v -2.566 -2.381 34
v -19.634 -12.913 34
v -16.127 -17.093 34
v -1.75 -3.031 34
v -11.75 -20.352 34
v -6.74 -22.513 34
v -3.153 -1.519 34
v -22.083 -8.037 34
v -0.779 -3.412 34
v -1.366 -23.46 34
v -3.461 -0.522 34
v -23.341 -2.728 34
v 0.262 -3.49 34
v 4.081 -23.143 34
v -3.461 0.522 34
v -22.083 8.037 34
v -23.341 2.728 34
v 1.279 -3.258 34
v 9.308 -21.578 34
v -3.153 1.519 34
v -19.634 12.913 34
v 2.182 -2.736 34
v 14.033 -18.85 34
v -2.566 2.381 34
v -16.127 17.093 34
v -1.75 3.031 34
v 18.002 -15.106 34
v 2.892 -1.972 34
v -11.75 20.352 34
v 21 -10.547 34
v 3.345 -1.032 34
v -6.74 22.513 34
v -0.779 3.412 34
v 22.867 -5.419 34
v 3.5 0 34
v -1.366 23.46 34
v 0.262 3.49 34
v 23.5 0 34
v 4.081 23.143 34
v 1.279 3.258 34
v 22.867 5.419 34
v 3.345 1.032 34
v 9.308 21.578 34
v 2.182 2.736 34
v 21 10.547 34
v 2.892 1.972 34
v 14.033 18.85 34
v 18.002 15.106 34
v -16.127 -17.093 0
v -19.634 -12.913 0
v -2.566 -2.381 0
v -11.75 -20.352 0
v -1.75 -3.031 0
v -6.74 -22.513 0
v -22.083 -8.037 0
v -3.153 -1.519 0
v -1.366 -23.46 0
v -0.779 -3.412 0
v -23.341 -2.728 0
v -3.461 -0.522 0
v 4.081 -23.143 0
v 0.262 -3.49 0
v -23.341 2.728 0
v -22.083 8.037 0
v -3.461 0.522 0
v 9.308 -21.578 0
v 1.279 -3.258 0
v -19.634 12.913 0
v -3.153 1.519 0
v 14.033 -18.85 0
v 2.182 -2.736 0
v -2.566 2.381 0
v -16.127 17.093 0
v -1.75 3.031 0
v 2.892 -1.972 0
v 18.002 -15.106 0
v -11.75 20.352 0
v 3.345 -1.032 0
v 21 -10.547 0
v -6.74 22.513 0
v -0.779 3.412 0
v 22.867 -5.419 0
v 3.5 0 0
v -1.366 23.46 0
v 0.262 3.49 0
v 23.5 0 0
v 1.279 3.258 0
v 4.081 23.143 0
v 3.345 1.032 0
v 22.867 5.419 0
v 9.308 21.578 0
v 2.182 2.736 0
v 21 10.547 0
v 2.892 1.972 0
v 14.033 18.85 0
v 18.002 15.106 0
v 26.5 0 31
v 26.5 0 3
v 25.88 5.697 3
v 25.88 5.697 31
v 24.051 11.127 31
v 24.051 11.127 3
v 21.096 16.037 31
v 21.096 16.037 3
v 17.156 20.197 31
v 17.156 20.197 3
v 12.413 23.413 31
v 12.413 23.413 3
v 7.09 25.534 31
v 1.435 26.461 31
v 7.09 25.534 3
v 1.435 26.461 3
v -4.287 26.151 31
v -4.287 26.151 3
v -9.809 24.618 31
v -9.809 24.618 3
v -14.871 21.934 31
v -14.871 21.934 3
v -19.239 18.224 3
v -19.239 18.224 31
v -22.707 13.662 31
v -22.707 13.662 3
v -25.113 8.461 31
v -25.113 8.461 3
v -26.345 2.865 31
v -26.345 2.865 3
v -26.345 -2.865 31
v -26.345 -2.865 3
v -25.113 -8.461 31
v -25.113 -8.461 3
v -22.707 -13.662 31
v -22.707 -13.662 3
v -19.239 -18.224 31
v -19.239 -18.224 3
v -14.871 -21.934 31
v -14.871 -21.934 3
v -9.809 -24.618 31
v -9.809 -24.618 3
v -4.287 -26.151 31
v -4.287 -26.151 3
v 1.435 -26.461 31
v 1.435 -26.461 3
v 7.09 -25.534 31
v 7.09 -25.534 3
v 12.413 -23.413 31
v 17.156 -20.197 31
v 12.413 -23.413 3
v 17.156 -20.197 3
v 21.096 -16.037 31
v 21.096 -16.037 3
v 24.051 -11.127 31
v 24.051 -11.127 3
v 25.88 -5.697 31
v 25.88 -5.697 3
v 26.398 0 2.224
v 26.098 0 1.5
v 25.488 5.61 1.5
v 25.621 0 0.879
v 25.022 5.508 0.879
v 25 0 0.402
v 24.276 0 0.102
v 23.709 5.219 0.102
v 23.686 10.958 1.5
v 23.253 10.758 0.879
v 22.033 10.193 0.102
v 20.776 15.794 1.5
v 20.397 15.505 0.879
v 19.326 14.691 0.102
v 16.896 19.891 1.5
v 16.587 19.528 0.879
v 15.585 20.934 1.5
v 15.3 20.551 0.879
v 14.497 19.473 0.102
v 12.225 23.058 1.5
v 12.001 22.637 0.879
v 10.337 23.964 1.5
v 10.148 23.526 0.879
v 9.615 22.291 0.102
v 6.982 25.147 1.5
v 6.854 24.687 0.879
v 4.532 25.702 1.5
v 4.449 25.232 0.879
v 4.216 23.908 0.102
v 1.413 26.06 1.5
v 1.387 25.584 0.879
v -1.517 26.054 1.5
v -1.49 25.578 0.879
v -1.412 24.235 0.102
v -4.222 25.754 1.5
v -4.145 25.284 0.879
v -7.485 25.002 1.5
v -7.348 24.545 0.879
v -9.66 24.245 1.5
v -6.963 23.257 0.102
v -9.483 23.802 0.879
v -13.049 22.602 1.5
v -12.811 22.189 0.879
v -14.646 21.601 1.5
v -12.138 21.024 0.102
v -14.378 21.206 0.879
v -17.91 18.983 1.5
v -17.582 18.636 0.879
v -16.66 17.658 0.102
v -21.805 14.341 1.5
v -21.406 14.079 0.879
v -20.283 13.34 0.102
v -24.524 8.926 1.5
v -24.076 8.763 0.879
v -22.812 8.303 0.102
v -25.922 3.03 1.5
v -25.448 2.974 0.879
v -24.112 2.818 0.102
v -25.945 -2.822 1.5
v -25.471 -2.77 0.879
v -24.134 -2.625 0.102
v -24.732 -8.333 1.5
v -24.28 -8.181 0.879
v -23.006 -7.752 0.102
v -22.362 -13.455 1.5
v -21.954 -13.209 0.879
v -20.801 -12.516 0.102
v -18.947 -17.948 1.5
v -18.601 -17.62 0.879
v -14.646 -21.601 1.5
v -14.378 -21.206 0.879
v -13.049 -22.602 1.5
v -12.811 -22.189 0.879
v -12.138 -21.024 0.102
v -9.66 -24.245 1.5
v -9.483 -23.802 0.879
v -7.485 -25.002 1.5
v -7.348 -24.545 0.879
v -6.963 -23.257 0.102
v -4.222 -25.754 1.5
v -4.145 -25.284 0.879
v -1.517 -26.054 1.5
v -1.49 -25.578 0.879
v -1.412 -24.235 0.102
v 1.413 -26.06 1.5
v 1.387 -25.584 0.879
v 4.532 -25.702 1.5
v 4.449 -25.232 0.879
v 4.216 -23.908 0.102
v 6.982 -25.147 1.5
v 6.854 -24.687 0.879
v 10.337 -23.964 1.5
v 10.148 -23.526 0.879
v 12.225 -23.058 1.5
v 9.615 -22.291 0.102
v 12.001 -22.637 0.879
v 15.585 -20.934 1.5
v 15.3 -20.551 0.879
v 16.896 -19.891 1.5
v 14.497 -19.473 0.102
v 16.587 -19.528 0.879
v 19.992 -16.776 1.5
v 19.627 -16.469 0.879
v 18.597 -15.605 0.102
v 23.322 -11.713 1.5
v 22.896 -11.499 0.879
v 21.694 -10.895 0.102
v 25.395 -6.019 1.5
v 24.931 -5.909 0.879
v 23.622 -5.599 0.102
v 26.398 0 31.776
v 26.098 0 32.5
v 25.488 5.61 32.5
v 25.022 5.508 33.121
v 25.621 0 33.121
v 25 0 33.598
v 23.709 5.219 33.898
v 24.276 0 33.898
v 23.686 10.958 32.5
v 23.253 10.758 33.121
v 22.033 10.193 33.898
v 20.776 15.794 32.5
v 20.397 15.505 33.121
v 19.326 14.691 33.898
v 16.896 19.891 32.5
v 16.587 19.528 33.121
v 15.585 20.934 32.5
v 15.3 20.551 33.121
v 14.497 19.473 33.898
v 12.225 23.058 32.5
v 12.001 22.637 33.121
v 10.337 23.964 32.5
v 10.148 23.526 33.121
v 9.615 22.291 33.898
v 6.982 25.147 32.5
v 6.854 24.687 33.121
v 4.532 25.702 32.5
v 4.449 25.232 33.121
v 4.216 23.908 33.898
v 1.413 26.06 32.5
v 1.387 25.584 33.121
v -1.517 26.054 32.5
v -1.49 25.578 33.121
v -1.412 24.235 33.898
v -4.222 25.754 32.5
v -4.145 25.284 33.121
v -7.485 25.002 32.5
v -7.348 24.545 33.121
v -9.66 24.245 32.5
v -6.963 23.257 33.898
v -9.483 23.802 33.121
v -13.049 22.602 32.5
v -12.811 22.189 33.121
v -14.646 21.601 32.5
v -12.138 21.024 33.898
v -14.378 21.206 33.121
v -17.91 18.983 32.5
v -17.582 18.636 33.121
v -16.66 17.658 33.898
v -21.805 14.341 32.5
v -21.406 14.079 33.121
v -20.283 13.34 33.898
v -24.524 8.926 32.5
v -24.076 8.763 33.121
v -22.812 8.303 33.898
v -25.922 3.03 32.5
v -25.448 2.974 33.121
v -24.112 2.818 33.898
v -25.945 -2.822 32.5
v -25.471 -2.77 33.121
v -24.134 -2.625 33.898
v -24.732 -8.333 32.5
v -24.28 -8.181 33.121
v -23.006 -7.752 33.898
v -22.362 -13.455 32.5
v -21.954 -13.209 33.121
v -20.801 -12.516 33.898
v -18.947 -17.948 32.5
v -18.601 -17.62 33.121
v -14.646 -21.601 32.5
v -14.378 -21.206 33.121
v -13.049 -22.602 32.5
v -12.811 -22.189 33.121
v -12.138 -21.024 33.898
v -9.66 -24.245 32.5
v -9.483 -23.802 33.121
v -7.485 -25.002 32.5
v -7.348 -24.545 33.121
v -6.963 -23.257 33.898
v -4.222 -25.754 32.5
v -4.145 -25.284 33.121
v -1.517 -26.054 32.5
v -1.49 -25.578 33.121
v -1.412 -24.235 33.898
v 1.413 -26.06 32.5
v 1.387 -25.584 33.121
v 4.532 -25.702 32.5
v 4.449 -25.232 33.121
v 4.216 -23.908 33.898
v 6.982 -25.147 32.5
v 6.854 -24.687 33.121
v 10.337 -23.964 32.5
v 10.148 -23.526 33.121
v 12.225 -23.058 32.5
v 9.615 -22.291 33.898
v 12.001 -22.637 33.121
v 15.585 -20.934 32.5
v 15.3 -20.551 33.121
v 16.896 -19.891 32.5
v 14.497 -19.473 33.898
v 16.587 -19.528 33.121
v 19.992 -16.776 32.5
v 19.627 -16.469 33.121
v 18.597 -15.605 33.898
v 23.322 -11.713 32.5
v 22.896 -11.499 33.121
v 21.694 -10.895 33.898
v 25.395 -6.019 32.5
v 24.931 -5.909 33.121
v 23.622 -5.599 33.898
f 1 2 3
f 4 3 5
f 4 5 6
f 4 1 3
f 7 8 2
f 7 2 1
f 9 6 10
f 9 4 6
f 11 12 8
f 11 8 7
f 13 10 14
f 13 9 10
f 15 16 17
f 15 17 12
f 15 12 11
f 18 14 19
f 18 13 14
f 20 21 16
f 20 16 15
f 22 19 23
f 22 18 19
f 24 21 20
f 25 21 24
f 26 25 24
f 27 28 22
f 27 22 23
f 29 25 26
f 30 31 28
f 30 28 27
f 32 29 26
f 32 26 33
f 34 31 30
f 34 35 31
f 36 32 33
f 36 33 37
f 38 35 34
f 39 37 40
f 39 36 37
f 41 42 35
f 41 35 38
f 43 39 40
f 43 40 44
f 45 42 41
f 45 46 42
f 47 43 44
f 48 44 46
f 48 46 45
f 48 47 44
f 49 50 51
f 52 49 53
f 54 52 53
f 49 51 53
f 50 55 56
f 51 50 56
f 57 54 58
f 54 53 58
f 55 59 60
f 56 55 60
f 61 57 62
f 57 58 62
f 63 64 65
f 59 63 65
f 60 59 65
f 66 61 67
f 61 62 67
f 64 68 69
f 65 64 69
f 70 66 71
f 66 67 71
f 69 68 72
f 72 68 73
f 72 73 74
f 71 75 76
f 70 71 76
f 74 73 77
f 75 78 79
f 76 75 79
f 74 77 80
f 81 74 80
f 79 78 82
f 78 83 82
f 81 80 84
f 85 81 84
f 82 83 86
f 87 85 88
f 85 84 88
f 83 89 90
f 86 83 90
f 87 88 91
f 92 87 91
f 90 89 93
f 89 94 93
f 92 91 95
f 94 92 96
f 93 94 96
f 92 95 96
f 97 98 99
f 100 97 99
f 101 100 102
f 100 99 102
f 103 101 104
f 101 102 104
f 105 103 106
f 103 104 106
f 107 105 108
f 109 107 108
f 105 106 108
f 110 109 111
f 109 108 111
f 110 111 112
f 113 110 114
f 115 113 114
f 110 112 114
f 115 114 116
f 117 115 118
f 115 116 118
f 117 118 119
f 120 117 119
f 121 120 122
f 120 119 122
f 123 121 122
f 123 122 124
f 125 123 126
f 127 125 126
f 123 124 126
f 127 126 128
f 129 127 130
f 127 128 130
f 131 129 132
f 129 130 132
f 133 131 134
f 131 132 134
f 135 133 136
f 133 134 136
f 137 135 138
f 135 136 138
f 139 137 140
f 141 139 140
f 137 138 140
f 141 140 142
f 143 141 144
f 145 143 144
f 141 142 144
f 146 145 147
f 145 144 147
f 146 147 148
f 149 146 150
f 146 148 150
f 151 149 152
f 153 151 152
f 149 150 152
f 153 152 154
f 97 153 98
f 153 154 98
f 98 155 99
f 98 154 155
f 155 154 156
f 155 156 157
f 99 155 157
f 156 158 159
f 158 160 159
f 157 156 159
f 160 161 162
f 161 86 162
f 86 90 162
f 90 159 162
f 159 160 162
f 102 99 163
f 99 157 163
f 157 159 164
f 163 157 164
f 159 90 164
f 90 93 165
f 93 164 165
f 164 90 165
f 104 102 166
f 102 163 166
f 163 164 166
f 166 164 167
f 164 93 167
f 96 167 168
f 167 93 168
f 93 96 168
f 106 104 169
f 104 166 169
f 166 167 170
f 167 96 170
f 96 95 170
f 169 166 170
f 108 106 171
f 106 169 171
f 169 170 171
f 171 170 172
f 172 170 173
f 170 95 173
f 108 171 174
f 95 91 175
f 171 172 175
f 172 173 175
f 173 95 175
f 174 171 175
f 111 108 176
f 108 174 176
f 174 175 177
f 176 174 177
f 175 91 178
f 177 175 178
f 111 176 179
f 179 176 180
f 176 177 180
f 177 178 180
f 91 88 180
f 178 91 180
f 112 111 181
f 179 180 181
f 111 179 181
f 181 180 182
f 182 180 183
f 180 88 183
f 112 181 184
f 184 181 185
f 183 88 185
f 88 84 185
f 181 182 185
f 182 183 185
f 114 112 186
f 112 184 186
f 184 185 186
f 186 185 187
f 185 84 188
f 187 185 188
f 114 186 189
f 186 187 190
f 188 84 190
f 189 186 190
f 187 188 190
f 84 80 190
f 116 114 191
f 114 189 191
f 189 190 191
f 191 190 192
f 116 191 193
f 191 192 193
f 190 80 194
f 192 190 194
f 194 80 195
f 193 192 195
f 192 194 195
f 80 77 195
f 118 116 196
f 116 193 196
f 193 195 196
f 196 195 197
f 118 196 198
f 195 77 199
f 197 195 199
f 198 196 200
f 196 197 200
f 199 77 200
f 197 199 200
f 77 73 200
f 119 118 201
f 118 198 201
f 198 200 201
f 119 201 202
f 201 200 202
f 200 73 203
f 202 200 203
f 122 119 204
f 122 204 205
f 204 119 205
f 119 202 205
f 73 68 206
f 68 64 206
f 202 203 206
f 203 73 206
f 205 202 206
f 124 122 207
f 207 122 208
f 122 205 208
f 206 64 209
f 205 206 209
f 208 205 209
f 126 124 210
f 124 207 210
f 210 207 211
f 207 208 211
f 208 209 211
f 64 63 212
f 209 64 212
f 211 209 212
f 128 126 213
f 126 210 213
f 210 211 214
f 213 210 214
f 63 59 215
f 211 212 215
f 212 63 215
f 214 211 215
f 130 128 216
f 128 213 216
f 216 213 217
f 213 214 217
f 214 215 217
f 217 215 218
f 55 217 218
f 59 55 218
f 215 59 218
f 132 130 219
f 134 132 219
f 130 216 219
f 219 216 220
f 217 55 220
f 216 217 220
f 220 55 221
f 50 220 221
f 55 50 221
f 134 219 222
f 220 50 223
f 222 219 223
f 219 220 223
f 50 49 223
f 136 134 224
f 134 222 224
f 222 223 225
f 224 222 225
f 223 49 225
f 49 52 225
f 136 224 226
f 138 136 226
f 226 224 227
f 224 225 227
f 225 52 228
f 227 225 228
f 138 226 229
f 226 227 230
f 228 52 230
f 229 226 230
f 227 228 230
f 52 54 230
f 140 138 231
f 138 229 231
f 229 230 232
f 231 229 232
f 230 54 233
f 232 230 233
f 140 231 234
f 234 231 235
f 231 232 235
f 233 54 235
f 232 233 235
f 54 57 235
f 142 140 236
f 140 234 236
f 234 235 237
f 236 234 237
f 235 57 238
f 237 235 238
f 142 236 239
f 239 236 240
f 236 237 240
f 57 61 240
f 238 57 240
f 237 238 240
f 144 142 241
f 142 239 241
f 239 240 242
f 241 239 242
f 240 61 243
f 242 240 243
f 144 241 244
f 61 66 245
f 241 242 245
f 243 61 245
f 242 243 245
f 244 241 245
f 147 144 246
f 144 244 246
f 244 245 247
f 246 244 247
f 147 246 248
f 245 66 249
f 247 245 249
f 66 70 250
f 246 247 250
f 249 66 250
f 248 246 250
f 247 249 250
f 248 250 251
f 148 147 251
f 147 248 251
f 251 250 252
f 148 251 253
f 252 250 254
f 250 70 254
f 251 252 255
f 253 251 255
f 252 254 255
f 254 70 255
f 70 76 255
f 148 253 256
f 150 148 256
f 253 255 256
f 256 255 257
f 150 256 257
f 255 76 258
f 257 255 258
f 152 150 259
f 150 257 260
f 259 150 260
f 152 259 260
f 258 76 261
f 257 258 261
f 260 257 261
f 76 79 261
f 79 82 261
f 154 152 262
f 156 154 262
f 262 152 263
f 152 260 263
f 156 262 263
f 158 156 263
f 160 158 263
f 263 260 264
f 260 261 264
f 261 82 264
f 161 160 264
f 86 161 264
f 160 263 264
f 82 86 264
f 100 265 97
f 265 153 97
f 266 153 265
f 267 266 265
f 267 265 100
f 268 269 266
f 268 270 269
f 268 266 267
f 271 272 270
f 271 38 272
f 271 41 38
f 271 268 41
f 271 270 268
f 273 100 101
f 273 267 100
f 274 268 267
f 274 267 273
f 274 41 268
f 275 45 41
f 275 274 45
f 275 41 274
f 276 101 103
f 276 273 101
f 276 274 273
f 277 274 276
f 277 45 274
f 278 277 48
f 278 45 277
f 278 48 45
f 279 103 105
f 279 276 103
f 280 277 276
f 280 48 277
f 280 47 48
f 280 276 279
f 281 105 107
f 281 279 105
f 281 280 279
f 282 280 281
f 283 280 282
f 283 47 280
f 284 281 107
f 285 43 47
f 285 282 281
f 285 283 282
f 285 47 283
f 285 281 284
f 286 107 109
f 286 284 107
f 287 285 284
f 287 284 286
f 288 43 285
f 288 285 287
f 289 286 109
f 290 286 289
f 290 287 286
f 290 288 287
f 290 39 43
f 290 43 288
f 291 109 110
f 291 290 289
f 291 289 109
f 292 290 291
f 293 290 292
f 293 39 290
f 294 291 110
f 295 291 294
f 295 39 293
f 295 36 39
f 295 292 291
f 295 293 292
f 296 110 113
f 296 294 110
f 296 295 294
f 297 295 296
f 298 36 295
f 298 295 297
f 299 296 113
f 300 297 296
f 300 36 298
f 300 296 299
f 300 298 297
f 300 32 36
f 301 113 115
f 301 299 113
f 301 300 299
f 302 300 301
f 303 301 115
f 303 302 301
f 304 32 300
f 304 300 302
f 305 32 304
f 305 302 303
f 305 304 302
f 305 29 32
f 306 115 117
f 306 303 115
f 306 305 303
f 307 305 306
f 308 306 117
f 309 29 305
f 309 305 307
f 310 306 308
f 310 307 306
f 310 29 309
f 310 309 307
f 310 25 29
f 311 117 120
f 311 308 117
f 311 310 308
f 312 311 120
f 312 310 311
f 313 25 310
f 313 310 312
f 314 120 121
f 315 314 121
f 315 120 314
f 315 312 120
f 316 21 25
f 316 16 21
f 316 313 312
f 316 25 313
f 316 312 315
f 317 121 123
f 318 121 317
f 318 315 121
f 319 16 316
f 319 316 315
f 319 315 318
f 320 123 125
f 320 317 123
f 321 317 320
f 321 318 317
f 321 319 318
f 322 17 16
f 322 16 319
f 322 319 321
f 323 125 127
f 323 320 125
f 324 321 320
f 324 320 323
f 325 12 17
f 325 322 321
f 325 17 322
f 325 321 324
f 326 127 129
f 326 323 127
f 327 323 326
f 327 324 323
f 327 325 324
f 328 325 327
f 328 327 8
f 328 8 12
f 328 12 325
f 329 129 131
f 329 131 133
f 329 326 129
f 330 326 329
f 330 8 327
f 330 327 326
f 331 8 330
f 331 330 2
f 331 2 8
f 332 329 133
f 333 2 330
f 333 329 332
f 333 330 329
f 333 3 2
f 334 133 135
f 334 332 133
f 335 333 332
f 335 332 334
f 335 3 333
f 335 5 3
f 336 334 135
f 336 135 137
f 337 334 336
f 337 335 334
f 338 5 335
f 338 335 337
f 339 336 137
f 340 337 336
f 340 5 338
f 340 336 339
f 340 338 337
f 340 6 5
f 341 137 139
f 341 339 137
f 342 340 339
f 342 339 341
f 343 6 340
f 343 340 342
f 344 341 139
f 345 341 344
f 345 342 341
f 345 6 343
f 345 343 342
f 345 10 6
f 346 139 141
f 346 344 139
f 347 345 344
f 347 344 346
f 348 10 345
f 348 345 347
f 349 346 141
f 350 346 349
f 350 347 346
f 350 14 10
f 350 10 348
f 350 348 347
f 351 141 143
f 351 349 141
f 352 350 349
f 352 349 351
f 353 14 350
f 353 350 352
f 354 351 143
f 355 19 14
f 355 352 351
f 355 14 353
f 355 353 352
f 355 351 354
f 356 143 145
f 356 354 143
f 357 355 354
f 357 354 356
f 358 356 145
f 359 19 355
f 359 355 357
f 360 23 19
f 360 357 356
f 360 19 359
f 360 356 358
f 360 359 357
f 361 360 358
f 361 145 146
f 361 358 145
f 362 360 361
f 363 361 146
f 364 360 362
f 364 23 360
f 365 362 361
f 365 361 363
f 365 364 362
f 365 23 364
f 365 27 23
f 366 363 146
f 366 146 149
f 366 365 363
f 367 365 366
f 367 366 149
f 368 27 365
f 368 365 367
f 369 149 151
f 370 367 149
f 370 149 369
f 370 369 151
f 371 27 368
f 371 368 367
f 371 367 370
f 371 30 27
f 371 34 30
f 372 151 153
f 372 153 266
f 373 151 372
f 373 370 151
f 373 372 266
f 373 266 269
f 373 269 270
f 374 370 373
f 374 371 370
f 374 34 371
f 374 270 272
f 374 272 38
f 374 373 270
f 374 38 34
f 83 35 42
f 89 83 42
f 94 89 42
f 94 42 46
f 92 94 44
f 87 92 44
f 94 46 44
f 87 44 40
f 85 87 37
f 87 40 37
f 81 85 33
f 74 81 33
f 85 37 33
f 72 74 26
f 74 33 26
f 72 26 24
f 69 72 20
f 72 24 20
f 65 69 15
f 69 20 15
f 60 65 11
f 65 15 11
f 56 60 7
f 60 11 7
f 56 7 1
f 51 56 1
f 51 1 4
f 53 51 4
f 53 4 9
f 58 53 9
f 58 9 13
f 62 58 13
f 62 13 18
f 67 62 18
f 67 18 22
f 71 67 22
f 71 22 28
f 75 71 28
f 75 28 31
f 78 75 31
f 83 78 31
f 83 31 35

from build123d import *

# Parameters (mm, degrees)
SKETCH1_R           = 26.5
BOSS_EXTRUDE1_DEPTH = 34
FILLET1_R           = 3
CUT_EXTRUDE1_REACH  = 36
SKETCH2_R           = 3.5


with BuildPart() as part:
    # Sketch1 → Boss-Extrude1 (new body)
    with BuildSketch(Plane.XY):
        Circle(SKETCH1_R)
    extrude(amount=BOSS_EXTRUDE1_DEPTH)

    # Fillet1
    fillet1_edges = [part.edges().sort_by_distance(p)[0] for p in [
        (-26.5, 0, 0),
        (-26.5, 0, 34),
    ]]
    fillet(fillet1_edges, radius=FILLET1_R)

    # Sketch2 → Cut-Extrude1 (cut, up to next)
    with BuildSketch(Plane.XY.offset(34), mode=Mode.PRIVATE) as cut_extrude1_sk1:
        Circle(SKETCH2_R)
    cut_extrude1_tool1 = extrude(cut_extrude1_sk1.sketch, amount=-CUT_EXTRUDE1_REACH, mode=Mode.PRIVATE) & part.part
    add(cut_extrude1_tool1.solids().sort_by_distance((0, 0, 34))[0], mode=Mode.SUBTRACT)


solid = part.part
